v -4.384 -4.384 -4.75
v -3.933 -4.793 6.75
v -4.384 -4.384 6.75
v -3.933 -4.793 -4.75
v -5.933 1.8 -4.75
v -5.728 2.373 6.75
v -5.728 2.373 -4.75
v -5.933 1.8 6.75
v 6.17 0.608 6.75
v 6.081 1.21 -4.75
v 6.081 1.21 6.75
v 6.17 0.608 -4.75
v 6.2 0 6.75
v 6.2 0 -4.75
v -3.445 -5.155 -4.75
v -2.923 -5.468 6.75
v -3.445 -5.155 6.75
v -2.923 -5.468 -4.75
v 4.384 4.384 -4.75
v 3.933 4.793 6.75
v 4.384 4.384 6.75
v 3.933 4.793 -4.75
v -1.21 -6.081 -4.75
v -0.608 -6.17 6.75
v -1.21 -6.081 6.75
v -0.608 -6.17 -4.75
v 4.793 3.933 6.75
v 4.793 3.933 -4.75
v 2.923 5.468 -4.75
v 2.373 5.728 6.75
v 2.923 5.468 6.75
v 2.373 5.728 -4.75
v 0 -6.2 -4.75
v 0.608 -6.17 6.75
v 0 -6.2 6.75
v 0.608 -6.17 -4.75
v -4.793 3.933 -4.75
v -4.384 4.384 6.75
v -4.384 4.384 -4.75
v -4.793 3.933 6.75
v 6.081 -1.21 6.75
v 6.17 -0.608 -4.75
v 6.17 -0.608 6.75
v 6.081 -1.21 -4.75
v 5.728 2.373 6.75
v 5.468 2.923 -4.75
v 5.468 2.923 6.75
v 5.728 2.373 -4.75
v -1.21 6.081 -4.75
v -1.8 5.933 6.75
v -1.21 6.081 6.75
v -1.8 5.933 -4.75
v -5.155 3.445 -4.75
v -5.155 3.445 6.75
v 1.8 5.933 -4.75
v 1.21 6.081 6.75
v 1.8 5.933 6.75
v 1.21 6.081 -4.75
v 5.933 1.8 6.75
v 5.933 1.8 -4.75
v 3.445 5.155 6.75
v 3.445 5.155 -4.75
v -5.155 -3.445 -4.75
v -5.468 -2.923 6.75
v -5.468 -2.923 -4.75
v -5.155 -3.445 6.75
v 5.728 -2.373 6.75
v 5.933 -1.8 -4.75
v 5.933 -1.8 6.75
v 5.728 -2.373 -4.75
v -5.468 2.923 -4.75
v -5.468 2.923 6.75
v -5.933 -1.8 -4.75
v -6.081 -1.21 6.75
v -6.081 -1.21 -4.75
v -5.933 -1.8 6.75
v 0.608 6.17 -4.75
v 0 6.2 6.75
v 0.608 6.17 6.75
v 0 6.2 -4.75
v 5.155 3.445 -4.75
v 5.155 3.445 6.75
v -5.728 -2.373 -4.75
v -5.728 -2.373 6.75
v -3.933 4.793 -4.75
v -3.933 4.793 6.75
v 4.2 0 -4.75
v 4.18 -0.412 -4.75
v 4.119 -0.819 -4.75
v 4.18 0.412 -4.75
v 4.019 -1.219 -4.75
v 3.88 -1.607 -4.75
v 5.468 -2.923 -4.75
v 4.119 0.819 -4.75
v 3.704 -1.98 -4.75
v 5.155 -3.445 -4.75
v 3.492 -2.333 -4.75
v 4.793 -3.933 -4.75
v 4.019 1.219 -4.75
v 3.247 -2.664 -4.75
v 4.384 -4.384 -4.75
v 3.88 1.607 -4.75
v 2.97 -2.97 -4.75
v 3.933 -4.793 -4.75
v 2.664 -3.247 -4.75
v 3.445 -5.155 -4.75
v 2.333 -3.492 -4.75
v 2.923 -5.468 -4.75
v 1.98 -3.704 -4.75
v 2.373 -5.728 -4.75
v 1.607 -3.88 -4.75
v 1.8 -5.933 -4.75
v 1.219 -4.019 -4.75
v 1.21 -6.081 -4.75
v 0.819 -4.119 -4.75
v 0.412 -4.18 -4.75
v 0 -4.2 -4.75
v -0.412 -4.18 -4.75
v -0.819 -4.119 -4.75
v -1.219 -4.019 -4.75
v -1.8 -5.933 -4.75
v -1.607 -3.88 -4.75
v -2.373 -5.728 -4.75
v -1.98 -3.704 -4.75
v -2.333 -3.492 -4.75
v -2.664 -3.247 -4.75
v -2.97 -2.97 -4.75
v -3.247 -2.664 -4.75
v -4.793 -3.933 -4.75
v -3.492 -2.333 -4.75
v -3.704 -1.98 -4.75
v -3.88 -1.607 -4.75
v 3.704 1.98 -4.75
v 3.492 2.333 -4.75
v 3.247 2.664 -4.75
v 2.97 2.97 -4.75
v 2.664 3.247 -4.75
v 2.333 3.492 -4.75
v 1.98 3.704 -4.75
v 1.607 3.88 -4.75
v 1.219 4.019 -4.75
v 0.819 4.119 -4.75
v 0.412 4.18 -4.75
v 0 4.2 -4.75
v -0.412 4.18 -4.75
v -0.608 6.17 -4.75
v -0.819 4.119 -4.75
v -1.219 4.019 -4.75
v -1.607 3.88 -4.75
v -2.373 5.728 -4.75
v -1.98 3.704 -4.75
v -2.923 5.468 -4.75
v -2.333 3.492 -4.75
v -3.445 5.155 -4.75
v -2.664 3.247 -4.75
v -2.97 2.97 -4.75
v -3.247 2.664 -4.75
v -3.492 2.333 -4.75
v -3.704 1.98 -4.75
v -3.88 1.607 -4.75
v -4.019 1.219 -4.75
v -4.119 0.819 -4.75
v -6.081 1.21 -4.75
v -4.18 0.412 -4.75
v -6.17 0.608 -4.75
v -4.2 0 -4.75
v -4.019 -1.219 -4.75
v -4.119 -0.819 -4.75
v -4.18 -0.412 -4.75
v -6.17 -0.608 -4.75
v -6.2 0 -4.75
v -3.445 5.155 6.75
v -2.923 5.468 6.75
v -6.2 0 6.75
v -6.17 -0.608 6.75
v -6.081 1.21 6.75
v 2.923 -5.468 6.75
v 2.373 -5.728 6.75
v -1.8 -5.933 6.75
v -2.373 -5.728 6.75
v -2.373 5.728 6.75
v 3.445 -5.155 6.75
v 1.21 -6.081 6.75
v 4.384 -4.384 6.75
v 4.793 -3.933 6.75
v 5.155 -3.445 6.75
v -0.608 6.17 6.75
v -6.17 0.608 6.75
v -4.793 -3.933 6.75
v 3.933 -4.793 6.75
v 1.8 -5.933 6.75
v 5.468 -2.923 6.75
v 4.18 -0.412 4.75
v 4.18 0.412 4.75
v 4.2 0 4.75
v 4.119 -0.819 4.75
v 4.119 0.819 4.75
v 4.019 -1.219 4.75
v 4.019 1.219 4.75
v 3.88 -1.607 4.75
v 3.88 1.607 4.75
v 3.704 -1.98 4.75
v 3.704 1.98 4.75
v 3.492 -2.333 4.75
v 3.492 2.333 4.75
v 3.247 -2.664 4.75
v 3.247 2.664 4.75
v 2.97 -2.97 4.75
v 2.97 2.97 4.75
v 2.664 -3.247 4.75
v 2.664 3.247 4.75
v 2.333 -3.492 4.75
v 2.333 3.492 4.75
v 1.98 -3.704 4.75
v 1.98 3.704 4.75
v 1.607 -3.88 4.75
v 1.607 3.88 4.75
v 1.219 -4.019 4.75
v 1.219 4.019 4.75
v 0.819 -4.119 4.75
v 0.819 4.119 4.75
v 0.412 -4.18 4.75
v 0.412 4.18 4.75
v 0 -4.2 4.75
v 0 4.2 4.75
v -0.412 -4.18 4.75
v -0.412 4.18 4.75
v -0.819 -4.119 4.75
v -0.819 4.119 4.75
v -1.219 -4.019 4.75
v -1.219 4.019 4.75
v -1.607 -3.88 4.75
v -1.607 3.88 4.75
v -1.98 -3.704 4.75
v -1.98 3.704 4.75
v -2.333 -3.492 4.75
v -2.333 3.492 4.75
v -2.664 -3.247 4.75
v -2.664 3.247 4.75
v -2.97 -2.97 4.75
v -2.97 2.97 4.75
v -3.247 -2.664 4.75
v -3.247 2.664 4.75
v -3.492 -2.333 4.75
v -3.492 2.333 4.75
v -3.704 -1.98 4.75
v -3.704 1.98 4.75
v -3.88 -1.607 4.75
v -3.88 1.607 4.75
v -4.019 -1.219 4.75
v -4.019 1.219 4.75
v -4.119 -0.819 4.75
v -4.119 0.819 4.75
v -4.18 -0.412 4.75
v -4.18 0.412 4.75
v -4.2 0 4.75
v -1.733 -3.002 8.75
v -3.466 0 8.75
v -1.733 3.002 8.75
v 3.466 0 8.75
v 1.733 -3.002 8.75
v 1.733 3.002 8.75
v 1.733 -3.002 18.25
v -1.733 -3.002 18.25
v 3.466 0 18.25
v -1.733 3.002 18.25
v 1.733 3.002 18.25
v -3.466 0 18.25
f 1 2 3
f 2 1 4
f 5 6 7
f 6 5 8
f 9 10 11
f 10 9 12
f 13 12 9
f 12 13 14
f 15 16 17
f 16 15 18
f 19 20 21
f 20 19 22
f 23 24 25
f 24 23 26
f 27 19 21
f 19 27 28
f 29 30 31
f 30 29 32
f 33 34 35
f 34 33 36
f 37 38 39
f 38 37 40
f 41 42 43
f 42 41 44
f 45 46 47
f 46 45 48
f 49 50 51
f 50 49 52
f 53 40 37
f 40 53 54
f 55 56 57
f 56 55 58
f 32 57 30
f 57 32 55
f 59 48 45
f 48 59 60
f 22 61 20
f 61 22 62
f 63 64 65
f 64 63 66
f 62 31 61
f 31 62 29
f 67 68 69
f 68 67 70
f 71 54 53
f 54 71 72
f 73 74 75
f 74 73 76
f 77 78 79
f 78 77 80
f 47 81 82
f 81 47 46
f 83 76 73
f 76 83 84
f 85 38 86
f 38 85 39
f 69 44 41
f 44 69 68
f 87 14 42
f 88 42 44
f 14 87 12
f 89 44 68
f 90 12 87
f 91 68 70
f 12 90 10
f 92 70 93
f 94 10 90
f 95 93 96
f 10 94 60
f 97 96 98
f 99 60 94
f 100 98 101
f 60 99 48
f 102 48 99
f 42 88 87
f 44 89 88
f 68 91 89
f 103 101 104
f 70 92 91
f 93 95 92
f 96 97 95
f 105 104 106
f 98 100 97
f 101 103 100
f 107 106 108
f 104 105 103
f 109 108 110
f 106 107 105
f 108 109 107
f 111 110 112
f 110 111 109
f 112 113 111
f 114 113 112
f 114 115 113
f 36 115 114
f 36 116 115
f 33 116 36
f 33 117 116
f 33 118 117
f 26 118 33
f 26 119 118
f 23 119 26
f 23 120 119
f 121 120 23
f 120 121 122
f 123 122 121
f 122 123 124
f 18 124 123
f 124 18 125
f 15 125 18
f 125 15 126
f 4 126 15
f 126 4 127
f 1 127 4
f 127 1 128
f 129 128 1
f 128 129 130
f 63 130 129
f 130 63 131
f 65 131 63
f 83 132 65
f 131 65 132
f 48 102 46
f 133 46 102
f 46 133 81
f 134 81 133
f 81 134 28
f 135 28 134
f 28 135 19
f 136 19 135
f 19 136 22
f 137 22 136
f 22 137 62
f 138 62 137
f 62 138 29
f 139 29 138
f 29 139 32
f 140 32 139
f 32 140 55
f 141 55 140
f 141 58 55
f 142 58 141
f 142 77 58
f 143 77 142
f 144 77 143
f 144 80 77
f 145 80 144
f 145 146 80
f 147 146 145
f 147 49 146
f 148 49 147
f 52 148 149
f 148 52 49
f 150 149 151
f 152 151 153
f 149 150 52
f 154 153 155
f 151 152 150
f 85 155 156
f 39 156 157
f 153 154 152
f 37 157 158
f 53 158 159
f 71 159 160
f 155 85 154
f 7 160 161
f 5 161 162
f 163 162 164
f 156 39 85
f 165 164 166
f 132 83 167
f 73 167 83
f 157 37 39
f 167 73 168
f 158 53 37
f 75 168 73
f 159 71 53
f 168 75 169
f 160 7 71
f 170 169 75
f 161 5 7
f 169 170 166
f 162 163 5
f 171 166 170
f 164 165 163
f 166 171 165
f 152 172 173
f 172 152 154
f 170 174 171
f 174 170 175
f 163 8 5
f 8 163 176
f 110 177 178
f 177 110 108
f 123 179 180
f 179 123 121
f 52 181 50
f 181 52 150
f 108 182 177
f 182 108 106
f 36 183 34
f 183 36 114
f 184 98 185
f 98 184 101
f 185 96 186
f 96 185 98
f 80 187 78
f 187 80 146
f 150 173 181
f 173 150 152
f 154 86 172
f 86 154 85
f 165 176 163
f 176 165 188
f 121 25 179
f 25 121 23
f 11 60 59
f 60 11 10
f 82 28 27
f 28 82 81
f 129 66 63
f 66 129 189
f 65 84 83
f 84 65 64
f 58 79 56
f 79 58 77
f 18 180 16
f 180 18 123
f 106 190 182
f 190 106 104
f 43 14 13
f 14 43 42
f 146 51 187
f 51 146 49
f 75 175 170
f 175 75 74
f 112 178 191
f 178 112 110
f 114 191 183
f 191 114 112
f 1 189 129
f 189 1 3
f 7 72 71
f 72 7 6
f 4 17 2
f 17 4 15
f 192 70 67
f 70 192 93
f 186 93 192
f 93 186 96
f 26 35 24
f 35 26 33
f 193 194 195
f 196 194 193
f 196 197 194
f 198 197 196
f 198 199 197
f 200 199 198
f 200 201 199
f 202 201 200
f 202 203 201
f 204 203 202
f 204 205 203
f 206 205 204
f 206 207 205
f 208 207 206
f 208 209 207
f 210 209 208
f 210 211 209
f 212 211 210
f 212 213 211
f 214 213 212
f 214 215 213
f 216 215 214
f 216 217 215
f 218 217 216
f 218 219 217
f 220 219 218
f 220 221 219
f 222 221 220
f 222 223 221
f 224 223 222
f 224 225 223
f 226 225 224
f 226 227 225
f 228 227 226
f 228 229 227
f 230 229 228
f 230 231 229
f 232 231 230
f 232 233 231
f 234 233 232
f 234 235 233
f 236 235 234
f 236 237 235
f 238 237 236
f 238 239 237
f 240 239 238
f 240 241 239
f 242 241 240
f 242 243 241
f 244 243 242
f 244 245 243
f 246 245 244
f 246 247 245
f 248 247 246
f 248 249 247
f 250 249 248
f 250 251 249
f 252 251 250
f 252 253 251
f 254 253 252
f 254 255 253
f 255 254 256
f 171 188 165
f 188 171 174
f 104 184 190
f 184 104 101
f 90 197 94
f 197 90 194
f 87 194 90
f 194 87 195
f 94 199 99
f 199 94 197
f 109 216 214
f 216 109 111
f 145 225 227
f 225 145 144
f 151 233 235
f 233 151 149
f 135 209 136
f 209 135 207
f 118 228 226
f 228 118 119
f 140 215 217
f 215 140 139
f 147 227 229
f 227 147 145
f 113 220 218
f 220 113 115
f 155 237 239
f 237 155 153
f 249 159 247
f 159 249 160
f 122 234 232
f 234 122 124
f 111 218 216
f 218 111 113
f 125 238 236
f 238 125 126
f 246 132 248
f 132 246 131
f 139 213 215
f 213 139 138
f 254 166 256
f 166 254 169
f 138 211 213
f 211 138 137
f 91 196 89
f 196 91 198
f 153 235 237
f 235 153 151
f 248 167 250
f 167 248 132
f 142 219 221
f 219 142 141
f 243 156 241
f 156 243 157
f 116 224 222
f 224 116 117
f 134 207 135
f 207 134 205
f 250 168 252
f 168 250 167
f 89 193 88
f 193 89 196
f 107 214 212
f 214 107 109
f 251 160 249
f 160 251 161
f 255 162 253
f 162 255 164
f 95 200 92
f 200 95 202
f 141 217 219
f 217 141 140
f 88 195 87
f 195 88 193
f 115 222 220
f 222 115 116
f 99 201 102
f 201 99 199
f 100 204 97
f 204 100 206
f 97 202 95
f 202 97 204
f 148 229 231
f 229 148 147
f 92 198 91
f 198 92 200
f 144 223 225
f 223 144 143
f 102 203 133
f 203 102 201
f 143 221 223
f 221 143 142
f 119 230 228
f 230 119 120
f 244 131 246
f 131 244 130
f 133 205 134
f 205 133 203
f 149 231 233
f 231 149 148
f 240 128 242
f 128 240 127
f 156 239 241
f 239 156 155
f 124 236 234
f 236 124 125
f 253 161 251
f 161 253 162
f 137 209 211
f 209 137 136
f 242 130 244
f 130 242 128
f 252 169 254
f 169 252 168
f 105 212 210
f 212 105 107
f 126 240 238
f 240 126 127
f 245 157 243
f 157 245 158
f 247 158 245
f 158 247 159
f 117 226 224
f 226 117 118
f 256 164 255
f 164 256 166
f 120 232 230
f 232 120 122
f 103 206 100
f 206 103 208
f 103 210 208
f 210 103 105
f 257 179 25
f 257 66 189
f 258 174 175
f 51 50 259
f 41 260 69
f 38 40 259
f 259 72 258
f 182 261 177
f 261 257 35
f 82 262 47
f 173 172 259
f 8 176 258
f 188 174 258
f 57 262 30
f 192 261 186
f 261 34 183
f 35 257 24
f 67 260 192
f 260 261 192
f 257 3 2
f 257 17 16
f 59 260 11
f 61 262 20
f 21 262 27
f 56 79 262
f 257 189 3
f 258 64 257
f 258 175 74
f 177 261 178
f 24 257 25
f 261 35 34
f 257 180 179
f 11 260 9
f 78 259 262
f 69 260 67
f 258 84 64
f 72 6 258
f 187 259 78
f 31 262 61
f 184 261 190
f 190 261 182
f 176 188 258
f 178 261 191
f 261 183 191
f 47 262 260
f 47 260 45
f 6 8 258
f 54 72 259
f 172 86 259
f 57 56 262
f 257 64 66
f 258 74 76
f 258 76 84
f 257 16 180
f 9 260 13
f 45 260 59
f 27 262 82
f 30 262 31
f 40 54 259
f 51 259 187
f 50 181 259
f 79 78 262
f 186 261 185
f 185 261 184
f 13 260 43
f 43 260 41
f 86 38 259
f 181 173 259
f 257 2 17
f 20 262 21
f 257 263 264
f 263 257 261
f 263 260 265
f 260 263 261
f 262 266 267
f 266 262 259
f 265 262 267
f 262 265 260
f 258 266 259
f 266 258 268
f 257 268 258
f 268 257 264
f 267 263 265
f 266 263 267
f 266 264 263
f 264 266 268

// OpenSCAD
 /*
  *  Filename: 8mm-screw-bit.scad
  *  Author: Anhtien Nguyen
  * Date: 7/7/2018
  * Description: this is the screw bit to turn the 8mm lead screw nut up & down.
  */
  
// 8mmT8  rod diameter
T8 = 8;  
// # of sides
sides=64;
// clearance
gap = 0.2;  
// wall thickness
thick = 2;  
// 1/4 inch hex bit  in mm
hexbit = 6.35; 
// height
height=9.5;  
// calculate hex bit radius with added consideration for the filament width
hex_rad = calcRad(hexbit,6) - gap;

drawBit();

function calcRad(x, fn) = (1/cos(180/fn)) * (x/2);

module drawBit($fn=sides)
{
      // draw the T8 rod holder
        difference() {
            cylinder(r=T8/2+gap+thick,h=height,center=true);
            cylinder(r=T8/2+gap,h=height+2,center=true);
        }
        // add a transition ring on top to reduce the torque stress
        translate([0,0,height/2]) hull() 
        {
        cylinder(r=T8/2+gap+thick,h=2);
        translate([0,0,2])  cylinder(r=hex_rad,h=2,$fn=6);
        }
         // draw the bit 
        translate([0,0,height/2+4])  cylinder(r=hex_rad,h=height,$fn=6);
}
